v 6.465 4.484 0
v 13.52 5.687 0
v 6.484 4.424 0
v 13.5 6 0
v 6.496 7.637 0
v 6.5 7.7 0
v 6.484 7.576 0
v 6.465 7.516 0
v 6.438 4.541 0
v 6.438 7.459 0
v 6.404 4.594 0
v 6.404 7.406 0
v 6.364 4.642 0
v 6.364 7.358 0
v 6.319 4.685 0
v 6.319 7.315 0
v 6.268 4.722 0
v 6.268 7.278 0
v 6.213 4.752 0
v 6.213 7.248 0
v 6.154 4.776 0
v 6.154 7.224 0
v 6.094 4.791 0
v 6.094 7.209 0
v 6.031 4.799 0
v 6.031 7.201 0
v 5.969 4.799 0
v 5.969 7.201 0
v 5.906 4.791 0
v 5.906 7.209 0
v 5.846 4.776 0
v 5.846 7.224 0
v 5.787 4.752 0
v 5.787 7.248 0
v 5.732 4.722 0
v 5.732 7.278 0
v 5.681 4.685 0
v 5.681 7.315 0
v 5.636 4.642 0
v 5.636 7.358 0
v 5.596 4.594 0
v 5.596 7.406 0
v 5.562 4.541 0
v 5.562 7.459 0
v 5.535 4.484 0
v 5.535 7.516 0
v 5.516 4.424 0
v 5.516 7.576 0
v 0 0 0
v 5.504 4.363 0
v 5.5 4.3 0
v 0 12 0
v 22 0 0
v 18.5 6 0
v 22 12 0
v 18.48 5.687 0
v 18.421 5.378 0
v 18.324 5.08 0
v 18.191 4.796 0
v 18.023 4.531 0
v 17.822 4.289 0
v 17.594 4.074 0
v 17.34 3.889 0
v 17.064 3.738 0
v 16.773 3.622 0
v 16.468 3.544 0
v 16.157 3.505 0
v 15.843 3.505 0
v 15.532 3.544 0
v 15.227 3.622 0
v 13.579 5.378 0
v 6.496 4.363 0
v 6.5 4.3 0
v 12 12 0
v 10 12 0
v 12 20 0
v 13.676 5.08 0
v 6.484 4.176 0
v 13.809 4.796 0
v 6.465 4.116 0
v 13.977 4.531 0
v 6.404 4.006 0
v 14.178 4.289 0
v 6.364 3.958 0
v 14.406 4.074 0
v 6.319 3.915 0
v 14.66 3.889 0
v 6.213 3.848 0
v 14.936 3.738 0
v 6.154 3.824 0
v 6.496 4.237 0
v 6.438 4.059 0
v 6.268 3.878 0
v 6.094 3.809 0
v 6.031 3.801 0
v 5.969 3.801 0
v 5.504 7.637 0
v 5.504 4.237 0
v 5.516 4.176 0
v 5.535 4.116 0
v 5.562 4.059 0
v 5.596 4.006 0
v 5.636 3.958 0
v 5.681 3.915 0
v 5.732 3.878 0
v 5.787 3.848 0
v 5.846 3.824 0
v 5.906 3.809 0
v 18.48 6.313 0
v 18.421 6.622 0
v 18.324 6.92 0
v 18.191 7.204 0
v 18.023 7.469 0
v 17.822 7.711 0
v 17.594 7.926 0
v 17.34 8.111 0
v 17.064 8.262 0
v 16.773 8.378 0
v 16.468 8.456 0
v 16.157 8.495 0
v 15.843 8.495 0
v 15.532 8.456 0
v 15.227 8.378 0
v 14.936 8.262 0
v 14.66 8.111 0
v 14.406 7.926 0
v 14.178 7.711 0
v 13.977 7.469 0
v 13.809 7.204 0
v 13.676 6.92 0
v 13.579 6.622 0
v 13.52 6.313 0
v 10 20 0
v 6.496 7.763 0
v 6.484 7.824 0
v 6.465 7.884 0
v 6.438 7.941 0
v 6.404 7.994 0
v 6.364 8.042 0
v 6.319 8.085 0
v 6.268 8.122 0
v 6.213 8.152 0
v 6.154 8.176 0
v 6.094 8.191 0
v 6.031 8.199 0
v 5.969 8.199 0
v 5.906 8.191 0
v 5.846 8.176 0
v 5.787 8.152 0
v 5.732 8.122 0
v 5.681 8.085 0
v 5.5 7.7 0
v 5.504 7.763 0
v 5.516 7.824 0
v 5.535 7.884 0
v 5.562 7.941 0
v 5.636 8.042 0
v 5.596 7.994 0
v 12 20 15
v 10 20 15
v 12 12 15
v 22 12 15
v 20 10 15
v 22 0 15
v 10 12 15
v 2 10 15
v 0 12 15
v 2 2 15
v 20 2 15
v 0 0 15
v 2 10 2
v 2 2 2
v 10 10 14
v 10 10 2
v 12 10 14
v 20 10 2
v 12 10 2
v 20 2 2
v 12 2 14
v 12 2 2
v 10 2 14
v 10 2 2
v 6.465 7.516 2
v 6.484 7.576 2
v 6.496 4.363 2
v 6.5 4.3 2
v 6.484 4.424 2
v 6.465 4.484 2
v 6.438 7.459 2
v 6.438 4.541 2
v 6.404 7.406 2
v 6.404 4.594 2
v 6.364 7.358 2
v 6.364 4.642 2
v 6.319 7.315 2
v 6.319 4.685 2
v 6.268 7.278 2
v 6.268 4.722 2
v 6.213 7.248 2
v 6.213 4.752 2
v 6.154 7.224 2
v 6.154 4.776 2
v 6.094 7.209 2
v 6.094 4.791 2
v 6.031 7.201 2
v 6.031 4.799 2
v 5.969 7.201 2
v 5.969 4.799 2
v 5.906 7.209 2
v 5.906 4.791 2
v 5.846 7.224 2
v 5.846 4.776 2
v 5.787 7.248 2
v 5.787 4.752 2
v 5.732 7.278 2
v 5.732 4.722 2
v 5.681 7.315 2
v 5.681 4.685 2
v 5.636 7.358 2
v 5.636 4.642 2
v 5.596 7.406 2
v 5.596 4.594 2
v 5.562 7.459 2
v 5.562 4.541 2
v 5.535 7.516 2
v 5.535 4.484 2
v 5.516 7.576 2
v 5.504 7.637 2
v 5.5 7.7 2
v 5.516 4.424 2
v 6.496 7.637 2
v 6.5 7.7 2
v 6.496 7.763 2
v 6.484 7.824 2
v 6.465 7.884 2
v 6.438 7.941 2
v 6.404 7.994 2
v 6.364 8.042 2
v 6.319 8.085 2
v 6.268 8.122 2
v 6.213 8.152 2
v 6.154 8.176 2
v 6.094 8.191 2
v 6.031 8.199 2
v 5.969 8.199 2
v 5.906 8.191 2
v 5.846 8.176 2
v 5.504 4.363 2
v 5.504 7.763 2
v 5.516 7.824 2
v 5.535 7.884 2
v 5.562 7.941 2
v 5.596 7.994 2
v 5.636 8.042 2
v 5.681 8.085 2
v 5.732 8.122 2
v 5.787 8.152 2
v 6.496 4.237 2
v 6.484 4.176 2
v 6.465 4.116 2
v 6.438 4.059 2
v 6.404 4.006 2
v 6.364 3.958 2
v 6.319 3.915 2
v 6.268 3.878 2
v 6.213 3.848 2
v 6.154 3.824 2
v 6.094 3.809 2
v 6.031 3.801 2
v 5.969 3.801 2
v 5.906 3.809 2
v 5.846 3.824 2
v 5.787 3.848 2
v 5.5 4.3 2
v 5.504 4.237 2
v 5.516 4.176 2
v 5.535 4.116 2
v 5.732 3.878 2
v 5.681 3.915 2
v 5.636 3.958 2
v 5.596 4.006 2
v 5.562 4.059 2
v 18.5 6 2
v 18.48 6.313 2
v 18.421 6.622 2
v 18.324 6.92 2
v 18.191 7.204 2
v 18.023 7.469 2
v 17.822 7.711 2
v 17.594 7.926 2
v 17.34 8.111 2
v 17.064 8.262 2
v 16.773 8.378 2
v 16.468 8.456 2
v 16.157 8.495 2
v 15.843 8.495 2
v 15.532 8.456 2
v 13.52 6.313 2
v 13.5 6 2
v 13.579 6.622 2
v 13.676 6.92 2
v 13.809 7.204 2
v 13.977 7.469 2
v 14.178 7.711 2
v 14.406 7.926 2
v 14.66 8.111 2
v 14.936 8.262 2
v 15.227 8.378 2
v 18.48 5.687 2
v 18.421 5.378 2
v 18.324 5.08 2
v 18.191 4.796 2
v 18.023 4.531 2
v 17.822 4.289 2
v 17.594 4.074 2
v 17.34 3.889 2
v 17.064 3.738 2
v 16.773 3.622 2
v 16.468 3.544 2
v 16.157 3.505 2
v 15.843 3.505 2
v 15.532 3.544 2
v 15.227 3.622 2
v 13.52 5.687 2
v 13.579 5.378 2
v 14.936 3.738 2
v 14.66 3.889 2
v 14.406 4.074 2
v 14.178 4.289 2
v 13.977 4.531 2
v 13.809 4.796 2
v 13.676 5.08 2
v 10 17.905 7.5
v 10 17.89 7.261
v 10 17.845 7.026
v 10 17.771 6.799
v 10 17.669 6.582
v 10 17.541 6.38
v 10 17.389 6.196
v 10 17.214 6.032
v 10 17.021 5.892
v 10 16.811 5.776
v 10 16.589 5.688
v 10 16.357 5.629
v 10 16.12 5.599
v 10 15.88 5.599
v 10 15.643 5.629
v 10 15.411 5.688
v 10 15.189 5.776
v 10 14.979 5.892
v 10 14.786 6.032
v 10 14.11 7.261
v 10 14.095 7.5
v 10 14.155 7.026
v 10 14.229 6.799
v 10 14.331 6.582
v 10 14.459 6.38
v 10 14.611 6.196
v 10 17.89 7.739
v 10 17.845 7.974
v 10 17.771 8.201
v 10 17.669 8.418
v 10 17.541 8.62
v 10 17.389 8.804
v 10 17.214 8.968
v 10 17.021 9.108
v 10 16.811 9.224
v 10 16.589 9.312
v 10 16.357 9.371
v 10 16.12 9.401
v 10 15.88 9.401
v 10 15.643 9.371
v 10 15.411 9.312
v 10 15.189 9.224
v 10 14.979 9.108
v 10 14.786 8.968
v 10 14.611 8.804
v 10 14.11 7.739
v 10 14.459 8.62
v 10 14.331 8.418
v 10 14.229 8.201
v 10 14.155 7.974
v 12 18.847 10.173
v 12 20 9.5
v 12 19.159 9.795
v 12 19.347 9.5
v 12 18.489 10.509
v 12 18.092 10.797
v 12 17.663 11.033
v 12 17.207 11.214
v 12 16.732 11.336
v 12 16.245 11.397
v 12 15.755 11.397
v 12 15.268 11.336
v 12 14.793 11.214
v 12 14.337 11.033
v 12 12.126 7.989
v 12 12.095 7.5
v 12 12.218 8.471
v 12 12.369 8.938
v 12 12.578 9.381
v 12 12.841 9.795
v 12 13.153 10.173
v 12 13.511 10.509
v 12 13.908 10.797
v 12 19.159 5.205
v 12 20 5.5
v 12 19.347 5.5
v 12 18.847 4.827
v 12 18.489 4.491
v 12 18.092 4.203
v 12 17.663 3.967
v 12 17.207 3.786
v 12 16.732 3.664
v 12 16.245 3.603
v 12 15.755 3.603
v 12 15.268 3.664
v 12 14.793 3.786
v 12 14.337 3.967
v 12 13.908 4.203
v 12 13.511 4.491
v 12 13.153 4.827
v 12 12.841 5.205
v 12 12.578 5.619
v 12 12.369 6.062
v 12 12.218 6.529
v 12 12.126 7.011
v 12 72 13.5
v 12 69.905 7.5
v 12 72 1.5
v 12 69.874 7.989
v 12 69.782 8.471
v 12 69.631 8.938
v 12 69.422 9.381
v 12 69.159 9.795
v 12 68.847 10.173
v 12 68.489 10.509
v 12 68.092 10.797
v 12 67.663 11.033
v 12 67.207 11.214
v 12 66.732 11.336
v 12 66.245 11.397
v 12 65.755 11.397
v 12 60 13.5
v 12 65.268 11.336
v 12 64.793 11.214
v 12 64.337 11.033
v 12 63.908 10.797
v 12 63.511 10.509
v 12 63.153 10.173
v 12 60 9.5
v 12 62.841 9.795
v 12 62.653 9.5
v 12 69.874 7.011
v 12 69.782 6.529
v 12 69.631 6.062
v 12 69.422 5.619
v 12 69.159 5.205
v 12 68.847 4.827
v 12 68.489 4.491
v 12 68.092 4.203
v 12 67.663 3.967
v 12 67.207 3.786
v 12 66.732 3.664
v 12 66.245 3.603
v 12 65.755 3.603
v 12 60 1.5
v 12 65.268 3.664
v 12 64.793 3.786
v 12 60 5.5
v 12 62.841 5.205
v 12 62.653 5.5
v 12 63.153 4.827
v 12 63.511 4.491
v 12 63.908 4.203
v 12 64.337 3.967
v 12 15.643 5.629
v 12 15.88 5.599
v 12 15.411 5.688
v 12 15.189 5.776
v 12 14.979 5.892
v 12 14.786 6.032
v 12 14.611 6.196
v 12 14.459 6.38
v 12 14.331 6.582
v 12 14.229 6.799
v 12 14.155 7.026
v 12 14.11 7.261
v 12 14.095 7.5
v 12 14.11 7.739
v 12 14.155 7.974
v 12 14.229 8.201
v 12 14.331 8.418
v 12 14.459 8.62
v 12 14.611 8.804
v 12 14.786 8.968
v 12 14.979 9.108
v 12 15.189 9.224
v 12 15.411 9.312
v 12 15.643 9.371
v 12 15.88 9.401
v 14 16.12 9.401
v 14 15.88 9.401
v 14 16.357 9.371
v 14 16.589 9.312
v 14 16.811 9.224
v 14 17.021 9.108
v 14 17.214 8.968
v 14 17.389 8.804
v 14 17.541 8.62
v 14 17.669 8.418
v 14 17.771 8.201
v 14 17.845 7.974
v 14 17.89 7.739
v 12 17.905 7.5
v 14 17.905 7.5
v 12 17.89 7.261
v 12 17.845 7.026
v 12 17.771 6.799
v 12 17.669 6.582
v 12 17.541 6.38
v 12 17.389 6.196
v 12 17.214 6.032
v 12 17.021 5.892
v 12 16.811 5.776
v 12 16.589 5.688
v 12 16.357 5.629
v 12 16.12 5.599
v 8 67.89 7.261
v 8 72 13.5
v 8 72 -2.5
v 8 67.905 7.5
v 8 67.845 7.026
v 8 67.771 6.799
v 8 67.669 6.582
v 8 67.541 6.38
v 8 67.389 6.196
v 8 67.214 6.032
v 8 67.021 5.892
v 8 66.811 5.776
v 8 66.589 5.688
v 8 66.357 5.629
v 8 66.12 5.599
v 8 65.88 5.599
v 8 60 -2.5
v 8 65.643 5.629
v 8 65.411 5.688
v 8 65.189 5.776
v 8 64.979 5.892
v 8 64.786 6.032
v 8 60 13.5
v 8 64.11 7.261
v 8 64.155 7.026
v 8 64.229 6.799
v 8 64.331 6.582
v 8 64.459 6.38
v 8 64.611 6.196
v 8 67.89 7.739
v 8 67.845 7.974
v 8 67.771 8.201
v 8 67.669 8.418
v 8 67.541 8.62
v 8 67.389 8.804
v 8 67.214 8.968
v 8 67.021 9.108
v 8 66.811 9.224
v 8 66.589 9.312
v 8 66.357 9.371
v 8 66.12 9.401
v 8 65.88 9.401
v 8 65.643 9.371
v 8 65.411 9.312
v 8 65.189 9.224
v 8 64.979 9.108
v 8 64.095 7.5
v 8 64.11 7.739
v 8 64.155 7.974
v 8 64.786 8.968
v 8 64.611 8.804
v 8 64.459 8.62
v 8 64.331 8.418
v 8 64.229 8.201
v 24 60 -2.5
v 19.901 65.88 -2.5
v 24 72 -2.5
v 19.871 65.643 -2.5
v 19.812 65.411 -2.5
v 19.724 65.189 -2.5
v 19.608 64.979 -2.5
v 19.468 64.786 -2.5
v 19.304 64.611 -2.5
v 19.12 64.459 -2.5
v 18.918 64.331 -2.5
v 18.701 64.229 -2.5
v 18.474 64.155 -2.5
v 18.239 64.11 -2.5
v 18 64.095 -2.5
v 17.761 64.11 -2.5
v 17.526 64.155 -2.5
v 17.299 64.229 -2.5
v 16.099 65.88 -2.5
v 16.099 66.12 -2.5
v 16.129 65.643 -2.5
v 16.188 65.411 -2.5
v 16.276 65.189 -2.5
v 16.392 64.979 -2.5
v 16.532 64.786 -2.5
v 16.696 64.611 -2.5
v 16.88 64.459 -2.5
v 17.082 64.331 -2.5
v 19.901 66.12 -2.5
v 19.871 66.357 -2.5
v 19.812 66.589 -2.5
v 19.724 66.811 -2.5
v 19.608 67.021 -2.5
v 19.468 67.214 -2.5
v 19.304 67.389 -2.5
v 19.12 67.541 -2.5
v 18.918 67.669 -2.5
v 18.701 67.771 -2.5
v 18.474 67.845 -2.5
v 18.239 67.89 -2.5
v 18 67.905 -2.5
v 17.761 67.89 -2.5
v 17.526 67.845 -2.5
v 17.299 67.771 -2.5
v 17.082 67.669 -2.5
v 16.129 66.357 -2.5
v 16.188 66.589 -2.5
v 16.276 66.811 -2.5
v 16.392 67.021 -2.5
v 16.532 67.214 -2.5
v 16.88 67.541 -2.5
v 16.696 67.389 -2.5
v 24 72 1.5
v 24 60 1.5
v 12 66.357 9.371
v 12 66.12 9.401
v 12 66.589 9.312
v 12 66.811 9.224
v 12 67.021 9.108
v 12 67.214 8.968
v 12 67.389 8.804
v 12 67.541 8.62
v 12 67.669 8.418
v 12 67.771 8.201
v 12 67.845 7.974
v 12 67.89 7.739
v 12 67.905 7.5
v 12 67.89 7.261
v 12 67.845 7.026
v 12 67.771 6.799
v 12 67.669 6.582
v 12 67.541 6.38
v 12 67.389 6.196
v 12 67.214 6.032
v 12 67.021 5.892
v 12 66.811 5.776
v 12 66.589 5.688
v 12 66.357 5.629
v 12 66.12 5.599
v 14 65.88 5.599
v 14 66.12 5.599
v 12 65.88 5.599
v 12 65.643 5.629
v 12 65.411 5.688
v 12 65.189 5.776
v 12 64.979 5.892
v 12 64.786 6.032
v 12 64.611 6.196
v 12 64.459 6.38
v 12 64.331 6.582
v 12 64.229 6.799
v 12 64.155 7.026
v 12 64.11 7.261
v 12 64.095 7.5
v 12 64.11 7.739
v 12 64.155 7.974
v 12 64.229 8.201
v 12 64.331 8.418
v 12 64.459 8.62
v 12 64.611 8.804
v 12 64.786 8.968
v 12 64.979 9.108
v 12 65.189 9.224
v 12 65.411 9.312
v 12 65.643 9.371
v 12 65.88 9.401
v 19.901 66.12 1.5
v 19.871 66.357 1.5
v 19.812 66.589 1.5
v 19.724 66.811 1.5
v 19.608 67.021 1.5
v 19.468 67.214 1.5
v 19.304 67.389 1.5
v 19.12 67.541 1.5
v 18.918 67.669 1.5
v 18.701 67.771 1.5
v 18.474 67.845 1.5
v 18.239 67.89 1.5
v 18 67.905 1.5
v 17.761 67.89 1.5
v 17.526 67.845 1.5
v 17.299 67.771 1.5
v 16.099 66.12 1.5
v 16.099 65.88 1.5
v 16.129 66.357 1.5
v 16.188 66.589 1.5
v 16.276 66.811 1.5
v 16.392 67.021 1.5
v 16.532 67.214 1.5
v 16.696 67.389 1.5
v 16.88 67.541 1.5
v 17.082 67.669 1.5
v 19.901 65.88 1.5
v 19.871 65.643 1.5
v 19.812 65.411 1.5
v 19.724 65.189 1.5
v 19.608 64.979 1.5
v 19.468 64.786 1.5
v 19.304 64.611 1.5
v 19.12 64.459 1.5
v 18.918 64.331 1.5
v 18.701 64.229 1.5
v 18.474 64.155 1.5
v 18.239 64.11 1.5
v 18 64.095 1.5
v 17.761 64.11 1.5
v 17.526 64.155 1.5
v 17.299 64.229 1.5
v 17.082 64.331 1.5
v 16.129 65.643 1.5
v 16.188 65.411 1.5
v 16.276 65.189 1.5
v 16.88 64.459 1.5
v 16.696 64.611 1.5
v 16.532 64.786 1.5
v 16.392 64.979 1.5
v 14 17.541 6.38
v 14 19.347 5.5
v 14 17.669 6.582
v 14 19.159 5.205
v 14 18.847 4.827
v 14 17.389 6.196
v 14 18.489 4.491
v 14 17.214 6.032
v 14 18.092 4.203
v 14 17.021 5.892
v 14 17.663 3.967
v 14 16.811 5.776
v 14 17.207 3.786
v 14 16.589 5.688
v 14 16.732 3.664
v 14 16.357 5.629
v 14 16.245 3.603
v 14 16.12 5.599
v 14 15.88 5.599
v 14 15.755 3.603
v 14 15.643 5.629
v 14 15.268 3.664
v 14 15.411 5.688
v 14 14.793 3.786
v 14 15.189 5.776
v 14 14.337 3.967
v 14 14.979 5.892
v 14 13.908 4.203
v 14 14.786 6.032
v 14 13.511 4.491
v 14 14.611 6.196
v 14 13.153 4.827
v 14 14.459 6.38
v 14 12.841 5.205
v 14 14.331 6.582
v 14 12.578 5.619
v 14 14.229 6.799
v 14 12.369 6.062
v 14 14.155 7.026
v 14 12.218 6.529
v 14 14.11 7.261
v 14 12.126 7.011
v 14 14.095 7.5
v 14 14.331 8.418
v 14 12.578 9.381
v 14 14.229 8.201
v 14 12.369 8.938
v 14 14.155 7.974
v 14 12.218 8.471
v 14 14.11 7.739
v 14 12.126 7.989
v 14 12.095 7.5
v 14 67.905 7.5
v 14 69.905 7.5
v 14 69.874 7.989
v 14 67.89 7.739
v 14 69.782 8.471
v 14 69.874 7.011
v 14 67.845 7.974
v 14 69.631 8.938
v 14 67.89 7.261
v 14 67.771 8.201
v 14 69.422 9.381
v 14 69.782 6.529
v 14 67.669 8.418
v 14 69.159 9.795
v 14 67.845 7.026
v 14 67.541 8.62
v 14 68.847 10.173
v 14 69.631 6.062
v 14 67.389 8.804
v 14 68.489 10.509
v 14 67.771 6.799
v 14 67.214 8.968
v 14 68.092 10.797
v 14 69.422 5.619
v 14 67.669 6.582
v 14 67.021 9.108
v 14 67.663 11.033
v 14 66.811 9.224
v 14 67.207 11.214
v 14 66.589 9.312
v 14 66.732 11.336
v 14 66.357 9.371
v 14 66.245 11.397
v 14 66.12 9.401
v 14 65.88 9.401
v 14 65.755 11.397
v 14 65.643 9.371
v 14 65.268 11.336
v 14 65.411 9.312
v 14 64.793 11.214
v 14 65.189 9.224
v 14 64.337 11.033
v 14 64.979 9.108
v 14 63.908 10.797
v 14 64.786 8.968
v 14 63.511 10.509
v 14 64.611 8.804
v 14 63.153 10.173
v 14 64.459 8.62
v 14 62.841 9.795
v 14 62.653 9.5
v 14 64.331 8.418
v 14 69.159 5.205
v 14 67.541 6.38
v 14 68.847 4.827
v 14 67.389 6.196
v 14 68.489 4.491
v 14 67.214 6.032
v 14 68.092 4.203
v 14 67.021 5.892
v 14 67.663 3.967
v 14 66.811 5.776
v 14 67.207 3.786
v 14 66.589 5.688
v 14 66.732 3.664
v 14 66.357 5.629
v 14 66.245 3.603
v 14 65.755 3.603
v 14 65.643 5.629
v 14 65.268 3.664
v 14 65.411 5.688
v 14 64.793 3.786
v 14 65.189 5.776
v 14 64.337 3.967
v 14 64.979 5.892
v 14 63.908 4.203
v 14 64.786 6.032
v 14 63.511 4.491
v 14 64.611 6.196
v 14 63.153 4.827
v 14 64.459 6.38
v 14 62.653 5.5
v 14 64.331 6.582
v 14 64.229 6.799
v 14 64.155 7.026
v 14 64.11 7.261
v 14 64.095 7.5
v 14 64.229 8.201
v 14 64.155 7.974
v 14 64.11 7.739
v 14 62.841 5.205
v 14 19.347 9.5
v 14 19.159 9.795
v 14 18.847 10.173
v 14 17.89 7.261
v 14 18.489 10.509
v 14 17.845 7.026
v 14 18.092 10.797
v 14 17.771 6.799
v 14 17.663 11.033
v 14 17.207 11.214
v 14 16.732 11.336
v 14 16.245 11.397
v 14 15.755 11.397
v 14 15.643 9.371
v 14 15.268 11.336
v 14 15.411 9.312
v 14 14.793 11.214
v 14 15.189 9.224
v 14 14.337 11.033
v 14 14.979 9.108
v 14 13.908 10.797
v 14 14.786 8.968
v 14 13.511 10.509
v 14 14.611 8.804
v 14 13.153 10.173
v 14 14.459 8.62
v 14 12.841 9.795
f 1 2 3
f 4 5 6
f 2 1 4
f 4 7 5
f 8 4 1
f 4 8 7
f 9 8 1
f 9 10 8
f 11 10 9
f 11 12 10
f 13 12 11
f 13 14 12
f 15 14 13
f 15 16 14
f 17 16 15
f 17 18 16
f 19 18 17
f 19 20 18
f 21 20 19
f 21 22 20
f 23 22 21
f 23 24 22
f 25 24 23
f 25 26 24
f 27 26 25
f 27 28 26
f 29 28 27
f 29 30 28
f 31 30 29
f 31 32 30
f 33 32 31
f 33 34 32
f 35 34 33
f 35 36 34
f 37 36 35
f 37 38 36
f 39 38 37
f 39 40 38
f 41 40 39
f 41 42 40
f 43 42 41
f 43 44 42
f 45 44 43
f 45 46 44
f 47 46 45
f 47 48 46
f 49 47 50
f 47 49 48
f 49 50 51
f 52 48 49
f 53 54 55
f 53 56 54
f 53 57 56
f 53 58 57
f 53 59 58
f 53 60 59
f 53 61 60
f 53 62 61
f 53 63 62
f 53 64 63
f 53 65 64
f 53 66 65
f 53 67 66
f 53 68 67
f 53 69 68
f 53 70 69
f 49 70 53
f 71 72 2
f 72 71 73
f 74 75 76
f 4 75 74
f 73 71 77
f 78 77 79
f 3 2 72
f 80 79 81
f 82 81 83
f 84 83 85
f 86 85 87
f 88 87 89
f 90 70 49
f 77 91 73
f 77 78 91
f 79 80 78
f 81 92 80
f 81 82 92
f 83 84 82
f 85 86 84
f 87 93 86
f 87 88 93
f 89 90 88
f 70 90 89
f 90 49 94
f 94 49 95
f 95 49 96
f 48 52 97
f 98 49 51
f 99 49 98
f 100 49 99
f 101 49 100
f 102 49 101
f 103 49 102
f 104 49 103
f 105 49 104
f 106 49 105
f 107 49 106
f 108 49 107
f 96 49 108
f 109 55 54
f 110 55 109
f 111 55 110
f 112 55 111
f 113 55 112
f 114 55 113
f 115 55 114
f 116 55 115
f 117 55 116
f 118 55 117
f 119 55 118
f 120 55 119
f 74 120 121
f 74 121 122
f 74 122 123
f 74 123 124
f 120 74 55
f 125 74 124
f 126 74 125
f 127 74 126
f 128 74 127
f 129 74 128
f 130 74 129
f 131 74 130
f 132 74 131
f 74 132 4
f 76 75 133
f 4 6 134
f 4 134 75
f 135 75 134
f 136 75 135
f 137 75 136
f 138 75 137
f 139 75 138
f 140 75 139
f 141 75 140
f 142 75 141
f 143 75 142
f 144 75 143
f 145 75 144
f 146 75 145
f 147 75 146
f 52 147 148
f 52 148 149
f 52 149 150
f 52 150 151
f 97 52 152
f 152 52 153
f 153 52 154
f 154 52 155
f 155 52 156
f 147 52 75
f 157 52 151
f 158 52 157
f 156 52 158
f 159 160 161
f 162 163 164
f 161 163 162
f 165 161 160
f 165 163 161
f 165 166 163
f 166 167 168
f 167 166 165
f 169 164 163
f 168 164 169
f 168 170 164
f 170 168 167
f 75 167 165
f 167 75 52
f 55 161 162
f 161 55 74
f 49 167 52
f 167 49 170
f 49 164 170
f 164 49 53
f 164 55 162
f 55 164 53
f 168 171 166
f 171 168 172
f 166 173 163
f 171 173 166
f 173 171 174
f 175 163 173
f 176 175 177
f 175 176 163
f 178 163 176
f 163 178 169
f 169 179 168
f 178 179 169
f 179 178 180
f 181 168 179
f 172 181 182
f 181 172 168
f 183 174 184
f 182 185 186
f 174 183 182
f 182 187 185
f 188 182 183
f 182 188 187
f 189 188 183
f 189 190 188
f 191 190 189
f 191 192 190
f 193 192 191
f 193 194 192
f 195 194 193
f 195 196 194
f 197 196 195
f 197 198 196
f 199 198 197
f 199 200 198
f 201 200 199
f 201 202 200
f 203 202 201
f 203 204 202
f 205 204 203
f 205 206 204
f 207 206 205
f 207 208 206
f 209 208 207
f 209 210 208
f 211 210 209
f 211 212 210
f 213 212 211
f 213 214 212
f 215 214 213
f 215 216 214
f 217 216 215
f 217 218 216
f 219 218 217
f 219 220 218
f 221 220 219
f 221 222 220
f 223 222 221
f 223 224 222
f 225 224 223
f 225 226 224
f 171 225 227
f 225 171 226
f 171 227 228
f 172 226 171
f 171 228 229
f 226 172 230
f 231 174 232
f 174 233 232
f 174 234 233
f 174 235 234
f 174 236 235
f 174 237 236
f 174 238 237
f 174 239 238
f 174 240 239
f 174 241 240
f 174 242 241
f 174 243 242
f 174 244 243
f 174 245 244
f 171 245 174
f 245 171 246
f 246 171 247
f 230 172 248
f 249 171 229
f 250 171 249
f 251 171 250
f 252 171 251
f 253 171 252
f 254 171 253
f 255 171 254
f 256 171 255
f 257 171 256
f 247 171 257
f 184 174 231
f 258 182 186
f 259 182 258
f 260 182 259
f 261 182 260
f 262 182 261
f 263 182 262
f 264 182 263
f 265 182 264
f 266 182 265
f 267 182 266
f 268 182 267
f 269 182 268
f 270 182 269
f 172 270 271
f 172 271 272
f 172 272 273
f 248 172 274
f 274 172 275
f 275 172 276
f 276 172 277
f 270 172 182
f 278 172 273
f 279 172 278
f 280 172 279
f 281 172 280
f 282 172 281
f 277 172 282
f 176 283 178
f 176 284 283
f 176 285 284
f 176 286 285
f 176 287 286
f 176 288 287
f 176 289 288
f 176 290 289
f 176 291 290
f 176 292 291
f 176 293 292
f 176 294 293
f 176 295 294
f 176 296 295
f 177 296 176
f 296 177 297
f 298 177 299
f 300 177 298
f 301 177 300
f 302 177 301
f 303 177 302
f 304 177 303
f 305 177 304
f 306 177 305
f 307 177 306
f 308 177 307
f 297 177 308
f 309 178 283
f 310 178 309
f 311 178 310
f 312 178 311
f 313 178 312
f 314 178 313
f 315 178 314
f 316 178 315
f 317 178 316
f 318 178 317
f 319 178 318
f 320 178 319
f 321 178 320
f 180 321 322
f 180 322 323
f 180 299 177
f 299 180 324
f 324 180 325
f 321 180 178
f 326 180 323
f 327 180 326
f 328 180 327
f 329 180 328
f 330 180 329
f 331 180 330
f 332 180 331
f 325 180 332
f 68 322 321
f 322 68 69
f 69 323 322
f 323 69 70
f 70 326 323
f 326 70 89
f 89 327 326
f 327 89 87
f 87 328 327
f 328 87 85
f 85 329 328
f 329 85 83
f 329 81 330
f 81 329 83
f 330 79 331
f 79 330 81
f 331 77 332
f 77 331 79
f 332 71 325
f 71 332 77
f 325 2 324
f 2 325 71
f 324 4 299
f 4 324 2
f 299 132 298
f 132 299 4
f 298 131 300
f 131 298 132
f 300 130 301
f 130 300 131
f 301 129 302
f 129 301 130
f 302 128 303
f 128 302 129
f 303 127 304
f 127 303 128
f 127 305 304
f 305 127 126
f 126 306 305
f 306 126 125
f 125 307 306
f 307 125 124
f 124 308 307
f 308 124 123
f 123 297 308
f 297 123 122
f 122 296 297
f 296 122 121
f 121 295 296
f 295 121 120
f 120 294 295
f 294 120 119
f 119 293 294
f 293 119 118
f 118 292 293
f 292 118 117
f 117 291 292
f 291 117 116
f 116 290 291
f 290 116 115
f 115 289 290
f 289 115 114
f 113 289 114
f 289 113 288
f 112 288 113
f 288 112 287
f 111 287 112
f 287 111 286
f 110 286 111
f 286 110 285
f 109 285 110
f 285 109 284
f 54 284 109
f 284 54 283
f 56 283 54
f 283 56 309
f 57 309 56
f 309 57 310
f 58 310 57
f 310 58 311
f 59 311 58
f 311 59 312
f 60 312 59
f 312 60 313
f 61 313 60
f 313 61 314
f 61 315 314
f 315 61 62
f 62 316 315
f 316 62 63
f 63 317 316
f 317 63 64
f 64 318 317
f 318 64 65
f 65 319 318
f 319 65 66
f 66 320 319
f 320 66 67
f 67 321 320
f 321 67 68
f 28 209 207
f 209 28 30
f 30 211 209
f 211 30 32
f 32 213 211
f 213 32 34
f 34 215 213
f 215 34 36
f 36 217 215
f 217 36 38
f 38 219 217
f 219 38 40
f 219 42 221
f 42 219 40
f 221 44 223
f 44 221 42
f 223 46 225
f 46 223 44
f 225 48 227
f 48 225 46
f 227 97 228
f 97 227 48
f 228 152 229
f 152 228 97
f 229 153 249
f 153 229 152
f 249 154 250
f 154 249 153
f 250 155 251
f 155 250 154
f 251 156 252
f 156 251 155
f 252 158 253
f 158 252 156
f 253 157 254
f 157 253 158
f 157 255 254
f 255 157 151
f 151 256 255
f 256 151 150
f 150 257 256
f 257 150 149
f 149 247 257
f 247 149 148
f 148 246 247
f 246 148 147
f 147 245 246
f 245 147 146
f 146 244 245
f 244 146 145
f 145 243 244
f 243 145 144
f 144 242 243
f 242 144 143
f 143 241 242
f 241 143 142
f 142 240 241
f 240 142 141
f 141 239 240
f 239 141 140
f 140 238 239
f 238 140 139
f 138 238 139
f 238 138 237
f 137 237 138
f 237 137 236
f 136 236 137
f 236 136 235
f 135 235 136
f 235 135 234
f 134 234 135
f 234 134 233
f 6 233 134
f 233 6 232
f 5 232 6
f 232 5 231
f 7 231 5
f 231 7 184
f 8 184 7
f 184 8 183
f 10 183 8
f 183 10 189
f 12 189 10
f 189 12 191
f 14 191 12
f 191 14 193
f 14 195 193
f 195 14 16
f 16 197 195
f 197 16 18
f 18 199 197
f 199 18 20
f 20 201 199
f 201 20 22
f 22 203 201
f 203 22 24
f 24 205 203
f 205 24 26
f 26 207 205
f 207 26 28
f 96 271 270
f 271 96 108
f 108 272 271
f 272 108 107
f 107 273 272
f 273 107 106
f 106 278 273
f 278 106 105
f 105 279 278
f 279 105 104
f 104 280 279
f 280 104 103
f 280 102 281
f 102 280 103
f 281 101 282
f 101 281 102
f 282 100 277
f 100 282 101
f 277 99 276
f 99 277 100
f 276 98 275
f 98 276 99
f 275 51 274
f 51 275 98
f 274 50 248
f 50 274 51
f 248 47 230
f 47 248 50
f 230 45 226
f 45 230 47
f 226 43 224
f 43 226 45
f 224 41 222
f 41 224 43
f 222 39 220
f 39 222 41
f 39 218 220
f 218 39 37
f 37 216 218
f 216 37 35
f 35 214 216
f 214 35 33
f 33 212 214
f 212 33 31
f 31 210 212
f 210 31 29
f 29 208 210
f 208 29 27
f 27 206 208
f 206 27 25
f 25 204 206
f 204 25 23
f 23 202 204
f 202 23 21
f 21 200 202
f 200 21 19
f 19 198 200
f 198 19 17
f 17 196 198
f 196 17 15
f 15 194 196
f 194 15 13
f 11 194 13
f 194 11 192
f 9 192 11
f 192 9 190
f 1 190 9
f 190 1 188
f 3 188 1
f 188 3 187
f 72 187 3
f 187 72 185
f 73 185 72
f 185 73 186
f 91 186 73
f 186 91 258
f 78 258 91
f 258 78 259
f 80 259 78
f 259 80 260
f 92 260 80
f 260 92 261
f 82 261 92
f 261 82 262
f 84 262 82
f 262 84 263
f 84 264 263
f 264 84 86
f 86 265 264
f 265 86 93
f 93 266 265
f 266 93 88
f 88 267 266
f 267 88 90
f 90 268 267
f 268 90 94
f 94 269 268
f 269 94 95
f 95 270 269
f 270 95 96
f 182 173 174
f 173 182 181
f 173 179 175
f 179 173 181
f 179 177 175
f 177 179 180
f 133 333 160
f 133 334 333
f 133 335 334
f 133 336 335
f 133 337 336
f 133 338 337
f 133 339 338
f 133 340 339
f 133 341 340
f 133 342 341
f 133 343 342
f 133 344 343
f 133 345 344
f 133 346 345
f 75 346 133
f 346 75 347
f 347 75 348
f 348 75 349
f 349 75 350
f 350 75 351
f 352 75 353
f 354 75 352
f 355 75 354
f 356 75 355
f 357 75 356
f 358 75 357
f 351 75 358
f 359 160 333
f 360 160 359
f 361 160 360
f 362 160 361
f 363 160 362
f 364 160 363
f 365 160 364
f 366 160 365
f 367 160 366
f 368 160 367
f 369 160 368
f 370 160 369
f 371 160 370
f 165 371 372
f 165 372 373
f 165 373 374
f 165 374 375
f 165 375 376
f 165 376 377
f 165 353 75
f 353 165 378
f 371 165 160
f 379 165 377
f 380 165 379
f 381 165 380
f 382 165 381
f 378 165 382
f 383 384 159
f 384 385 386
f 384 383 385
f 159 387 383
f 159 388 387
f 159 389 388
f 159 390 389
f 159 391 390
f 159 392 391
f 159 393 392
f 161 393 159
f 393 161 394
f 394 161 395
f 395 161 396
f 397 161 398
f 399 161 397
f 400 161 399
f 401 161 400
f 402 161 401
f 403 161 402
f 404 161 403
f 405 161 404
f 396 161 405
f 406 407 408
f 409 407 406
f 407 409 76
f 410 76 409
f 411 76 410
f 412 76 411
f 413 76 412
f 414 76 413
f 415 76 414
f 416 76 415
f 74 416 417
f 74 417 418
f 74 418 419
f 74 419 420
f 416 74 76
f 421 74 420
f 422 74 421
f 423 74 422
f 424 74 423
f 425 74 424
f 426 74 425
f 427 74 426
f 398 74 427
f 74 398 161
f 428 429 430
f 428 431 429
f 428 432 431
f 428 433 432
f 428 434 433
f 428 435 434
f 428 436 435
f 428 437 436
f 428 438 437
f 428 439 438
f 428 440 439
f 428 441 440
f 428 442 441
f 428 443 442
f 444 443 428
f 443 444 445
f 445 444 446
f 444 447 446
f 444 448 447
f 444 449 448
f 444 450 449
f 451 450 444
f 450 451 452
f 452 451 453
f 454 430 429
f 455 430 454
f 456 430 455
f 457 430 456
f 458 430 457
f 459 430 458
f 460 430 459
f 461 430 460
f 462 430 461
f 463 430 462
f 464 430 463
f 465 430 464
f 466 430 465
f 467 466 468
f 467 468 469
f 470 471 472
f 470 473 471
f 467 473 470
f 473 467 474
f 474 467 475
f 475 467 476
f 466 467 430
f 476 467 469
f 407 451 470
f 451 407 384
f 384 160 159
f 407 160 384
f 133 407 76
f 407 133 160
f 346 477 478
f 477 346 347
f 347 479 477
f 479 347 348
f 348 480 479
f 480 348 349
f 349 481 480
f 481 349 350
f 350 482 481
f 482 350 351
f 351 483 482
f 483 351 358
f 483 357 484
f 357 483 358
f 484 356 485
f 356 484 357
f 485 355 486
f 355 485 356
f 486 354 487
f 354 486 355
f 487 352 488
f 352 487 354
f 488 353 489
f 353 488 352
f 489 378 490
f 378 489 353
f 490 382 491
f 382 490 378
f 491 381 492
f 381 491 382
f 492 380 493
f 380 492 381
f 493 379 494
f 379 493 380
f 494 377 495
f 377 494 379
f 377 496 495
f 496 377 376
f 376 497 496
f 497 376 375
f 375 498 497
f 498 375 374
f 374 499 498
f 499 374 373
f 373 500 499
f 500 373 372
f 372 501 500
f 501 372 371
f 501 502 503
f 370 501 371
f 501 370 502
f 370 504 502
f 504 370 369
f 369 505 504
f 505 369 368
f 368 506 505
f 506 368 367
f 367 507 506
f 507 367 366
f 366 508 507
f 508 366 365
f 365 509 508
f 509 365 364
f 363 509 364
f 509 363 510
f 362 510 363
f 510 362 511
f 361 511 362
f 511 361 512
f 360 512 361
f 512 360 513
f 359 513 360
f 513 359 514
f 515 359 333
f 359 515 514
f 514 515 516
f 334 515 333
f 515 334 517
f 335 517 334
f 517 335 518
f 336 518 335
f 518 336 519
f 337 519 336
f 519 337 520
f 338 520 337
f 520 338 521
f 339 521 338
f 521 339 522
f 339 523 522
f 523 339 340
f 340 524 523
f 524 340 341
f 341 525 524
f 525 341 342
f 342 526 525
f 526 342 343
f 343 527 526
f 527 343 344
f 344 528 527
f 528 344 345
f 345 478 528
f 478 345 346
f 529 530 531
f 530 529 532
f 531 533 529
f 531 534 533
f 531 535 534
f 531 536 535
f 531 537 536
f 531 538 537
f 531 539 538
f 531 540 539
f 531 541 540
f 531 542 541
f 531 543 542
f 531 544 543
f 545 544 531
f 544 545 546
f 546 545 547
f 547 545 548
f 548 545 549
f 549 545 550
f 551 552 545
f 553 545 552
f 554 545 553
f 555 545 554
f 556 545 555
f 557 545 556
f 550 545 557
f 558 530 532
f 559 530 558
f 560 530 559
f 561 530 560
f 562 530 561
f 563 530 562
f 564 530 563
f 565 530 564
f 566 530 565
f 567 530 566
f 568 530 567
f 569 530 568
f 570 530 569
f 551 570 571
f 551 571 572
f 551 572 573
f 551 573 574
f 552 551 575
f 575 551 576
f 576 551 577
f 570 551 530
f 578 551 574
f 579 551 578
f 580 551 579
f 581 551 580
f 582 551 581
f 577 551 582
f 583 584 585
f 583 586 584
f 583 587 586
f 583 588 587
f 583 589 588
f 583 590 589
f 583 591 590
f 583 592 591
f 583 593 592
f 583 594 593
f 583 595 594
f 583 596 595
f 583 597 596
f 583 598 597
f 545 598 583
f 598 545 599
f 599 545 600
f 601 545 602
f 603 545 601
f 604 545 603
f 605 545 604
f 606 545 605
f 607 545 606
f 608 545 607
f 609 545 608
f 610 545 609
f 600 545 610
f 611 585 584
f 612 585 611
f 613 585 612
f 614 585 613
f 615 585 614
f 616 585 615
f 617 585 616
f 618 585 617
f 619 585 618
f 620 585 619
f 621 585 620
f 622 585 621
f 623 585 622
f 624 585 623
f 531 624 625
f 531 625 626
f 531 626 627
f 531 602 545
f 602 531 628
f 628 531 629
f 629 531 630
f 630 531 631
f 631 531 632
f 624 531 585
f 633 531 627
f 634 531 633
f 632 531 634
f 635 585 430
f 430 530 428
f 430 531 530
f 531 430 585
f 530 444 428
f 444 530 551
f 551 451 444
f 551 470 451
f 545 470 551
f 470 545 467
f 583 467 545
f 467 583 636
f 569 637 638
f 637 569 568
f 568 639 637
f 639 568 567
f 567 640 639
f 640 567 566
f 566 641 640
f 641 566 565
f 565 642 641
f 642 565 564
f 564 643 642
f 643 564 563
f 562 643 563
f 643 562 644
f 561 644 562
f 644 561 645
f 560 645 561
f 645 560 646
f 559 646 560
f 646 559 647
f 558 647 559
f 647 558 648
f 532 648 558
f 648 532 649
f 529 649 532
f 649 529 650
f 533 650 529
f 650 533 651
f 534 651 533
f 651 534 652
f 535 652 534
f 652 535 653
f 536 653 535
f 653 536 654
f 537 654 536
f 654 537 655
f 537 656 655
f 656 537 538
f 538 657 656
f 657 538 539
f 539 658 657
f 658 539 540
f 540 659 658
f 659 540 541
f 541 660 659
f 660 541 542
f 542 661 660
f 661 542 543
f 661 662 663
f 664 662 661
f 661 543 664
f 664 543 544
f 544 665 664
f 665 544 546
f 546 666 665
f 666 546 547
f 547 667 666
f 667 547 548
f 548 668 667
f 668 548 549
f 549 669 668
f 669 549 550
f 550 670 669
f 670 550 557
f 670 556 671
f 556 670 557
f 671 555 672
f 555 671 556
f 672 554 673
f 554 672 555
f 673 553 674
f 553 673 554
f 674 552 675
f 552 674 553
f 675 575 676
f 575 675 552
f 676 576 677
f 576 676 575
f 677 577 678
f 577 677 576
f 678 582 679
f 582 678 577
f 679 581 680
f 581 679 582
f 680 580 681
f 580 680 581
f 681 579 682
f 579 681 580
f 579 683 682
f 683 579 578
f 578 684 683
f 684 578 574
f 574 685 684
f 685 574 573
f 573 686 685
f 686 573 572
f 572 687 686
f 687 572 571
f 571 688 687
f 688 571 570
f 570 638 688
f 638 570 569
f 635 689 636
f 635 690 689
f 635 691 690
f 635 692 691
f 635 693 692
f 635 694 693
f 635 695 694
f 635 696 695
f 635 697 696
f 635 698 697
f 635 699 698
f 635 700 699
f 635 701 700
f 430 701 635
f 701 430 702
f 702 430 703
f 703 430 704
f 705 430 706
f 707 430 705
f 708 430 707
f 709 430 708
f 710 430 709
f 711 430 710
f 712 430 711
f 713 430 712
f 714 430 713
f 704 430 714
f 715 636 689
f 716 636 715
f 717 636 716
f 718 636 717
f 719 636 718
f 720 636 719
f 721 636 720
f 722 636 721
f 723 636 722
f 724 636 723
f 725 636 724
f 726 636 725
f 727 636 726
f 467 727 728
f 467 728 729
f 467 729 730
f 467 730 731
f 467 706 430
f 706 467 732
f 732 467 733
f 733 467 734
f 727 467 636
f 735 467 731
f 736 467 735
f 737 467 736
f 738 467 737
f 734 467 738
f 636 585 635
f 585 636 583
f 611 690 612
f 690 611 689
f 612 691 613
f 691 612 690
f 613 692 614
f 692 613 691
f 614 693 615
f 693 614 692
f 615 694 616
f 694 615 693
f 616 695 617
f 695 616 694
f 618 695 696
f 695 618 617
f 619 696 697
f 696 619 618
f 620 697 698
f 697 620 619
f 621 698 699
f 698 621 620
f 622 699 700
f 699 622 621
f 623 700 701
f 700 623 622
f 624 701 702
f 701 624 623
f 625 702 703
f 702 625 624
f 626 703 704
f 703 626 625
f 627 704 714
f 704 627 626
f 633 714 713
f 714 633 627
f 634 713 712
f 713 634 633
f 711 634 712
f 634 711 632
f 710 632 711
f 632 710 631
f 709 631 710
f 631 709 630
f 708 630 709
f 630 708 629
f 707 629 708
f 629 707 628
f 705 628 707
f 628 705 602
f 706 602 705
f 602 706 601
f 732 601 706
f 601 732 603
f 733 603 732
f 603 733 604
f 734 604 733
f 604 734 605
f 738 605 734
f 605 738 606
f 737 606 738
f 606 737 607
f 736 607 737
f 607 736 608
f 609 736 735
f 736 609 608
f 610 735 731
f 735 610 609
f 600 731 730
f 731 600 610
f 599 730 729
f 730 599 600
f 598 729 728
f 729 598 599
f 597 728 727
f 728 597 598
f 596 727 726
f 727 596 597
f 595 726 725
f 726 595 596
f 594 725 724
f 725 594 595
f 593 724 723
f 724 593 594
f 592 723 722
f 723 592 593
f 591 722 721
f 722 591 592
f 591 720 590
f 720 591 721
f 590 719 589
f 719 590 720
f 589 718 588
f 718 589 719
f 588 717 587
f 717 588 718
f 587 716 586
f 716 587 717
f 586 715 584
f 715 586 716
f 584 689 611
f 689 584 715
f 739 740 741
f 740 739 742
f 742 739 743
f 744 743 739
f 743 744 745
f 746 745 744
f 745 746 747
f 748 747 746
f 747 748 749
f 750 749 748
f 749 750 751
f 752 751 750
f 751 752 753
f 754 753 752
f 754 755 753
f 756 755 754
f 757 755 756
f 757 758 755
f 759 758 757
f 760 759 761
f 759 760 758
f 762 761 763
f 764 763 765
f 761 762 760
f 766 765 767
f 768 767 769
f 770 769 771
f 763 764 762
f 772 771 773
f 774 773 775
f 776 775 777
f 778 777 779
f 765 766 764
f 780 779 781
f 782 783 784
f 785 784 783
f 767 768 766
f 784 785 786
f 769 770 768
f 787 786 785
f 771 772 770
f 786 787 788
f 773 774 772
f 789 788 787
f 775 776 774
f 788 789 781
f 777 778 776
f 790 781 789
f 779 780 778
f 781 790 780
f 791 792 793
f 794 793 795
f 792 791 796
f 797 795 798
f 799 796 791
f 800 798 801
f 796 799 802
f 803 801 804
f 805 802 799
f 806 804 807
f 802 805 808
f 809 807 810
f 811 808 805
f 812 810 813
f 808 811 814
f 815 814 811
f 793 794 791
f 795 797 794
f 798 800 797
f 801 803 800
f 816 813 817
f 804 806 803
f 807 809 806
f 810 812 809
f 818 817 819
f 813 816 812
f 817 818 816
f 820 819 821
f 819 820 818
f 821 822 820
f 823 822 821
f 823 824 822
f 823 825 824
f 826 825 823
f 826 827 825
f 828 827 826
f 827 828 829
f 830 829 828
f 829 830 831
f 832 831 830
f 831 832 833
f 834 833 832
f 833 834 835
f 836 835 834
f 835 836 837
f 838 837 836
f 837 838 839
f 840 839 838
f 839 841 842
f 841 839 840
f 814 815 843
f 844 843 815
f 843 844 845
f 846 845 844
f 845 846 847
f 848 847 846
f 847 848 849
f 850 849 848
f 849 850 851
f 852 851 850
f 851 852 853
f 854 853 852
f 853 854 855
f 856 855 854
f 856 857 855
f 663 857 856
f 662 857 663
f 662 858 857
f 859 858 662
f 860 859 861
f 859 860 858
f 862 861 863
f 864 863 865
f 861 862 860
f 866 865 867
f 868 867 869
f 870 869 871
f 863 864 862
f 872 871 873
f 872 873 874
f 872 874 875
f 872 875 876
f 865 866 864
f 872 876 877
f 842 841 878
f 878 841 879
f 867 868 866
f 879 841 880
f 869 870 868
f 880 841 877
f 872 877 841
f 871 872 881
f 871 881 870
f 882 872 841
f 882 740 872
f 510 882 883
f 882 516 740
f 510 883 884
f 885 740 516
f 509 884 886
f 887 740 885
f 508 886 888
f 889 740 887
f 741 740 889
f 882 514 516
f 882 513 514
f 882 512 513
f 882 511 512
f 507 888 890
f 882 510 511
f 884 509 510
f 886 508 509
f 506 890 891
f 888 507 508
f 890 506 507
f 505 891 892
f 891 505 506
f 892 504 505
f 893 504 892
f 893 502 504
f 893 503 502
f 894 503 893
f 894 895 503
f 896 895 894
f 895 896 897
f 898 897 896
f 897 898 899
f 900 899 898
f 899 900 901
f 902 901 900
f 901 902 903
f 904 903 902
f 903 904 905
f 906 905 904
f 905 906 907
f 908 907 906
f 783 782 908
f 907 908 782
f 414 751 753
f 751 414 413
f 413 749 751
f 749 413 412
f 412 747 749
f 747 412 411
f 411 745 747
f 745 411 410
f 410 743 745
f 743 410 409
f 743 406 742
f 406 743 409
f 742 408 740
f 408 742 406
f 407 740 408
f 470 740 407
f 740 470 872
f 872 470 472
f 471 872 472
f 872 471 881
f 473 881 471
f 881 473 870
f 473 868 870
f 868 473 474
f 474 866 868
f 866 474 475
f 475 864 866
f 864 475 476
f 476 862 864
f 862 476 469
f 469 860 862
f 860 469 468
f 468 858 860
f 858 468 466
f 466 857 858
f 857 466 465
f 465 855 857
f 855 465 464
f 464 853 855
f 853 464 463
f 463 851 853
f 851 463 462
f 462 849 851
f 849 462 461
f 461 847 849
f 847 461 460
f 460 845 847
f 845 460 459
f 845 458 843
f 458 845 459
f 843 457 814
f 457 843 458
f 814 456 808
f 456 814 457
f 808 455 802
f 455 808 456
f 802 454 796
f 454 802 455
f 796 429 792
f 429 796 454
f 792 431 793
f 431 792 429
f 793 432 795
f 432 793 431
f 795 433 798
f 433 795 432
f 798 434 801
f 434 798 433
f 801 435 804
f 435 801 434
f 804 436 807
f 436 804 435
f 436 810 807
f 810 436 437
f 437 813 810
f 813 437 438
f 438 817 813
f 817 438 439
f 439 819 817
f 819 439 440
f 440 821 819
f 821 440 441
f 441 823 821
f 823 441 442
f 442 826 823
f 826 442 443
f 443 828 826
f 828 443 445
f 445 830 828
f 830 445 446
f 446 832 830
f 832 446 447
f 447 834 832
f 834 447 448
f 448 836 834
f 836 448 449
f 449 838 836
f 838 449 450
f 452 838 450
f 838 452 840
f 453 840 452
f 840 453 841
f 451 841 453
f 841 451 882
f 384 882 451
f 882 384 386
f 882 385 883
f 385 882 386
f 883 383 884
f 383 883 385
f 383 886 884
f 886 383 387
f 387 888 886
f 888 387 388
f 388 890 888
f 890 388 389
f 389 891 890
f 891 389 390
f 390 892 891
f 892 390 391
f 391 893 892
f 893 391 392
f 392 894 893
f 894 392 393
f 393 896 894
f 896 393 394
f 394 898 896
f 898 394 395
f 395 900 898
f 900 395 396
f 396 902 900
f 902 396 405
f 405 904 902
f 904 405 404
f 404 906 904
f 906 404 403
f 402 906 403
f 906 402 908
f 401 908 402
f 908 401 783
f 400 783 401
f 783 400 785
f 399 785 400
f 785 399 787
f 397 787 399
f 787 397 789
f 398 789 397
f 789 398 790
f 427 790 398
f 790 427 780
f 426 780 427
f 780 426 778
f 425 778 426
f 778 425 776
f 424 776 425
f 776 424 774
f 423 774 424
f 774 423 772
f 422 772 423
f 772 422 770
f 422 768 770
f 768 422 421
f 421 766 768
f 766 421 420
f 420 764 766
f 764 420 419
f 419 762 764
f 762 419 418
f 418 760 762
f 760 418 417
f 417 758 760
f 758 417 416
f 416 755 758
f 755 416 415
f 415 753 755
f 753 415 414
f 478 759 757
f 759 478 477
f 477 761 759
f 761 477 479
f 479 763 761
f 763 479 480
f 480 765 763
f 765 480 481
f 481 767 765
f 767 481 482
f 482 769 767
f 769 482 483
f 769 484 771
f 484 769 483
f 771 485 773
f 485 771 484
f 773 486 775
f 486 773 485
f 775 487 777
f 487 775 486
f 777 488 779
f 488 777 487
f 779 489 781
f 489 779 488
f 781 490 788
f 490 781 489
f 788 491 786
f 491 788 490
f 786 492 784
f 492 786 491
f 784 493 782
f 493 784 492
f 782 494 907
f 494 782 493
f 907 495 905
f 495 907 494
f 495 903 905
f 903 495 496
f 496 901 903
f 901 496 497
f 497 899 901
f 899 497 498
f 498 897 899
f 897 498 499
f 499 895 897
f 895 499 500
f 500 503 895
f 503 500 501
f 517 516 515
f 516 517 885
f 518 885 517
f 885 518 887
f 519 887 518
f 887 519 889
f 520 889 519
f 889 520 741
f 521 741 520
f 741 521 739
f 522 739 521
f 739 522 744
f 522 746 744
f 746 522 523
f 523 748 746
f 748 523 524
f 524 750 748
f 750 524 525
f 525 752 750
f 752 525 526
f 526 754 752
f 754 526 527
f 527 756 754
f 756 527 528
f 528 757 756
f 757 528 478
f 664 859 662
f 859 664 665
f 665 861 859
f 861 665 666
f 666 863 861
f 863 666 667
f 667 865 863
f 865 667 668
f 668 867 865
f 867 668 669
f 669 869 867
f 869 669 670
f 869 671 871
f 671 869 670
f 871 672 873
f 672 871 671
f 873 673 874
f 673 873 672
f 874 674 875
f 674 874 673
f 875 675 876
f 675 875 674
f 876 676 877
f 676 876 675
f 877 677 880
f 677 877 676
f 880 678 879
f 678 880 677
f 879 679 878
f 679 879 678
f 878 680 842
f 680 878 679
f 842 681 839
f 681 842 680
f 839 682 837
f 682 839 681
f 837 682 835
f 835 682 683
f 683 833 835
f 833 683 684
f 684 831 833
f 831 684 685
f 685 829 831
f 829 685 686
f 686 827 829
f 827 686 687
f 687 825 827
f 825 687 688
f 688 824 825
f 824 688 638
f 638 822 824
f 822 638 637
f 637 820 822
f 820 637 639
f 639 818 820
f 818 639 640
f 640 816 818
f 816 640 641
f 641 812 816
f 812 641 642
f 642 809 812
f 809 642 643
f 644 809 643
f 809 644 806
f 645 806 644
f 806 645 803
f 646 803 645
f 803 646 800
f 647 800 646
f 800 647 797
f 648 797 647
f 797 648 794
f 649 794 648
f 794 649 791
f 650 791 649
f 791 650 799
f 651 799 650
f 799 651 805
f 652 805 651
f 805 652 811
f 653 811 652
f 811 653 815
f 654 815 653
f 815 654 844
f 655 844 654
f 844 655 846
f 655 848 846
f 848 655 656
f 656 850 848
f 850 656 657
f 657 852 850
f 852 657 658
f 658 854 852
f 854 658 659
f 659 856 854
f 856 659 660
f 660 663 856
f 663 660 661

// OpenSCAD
$fn = 50;

inches_to_mm = 25.4;

mounting_hole_diameter = 0.150*inches_to_mm;
mounting_tab_width = 8;

wall_thickness = 2;
box_size = 8;
shroud_height = 13;
baffle_height = 12;

cds_wire_centers = 3.4;
cds_wire_diameter = 1;

led_diameter = 5;

sensor_centers =7;

arm_width = 4;
arm_length =  50;

robot_mounting_tab_width = 12;
robot_mounting_tab_thickness = 4;

// -------------------------- parts -----------------

//color("red") color_sensor();
//color("blue") sensor_arm();
//color("green") robot_mount();

// ----------------- assembly --------------

color("red") color_sensor();
color("blue") translate([wall_thickness+box_size+wall_thickness, wall_thickness+box_size+wall_thickness+mounting_tab_width/2, (wall_thickness+shroud_height)/2]) rotate([90,0,90]) sensor_arm();
color("green") translate([wall_thickness+box_size+wall_thickness, wall_thickness+box_size+wall_thickness+mounting_tab_width/2+arm_length, (wall_thickness+shroud_height)/2]) rotate([-90,0,-90]) translate([-robot_mounting_tab_width/2, -robot_mounting_tab_width/2,-robot_mounting_tab_thickness]) robot_mount();

// ---------------------- modules -------------------

module color_sensor()
{
  // outer shell
  linear_extrude(height = wall_thickness+shroud_height) difference()
  {
    square([2*wall_thickness+wall_thickness+2*box_size, 2*wall_thickness+box_size]);
    translate([wall_thickness, wall_thickness]) square([wall_thickness+2*box_size, box_size]);
  }
  
  // bottom
  linear_extrude(height = wall_thickness) difference()
  {
    square([2*wall_thickness+wall_thickness+2*box_size, 2*wall_thickness+box_size]);
    // LED
    translate([wall_thickness+box_size+wall_thickness+box_size/2, wall_thickness+box_size/2]) circle(r = led_diameter/2);
    
    // cds photocell
    translate([wall_thickness+box_size/2, wall_thickness+box_size/2]) union()
    {
      translate([0,cds_wire_centers/2]) circle(r=cds_wire_diameter/2);
      translate([0,-cds_wire_centers/2]) circle(r=cds_wire_diameter/2);
    }
  }
  
  // baffle
  linear_extrude(height = wall_thickness+baffle_height) translate([wall_thickness+box_size, wall_thickness]) square([wall_thickness, box_size]);
  
  // mounting tab
  translate([wall_thickness+box_size, 2*wall_thickness+box_size,0]) rotate([90,0,90]) linear_extrude(height=wall_thickness) difference()
  {
    square([mounting_tab_width, wall_thickness+shroud_height]);
    translate([mounting_tab_width/2, (wall_thickness+shroud_height)/2]) circle(r=mounting_hole_diameter/2);
  }
}

module sensor_arm()
{
  linear_extrude(height = wall_thickness) difference()
  {
    union()
    {
      translate([0,-arm_width/2]) square([arm_length, arm_width]);
      circle(r= mounting_hole_diameter/2+arm_width/2);
      translate([arm_length,0,0]) circle(r= mounting_hole_diameter/2+arm_width/2);    
    }
    
    circle(r= mounting_hole_diameter/2);
    translate([arm_length,0,0]) circle(r= mounting_hole_diameter/2);
  }
}

module robot_mount()
{
  linear_extrude(height = robot_mounting_tab_thickness) difference()
  {
    square([robot_mounting_tab_width,robot_mounting_tab_width+robot_mounting_tab_thickness]);
    translate([robot_mounting_tab_width/2, robot_mounting_tab_width/2]) circle(r=mounting_hole_diameter/2);
  }
  
  translate([0,robot_mounting_tab_width,0,]) rotate([-90,0,0]) linear_extrude(height = robot_mounting_tab_thickness) translate([0,-robot_mounting_tab_width-robot_mounting_tab_thickness]) difference()
  {
    square([robot_mounting_tab_width,robot_mounting_tab_width+robot_mounting_tab_thickness]);
    translate([robot_mounting_tab_width/2, robot_mounting_tab_width/2]) circle(r=mounting_hole_diameter/2);
  }
}
